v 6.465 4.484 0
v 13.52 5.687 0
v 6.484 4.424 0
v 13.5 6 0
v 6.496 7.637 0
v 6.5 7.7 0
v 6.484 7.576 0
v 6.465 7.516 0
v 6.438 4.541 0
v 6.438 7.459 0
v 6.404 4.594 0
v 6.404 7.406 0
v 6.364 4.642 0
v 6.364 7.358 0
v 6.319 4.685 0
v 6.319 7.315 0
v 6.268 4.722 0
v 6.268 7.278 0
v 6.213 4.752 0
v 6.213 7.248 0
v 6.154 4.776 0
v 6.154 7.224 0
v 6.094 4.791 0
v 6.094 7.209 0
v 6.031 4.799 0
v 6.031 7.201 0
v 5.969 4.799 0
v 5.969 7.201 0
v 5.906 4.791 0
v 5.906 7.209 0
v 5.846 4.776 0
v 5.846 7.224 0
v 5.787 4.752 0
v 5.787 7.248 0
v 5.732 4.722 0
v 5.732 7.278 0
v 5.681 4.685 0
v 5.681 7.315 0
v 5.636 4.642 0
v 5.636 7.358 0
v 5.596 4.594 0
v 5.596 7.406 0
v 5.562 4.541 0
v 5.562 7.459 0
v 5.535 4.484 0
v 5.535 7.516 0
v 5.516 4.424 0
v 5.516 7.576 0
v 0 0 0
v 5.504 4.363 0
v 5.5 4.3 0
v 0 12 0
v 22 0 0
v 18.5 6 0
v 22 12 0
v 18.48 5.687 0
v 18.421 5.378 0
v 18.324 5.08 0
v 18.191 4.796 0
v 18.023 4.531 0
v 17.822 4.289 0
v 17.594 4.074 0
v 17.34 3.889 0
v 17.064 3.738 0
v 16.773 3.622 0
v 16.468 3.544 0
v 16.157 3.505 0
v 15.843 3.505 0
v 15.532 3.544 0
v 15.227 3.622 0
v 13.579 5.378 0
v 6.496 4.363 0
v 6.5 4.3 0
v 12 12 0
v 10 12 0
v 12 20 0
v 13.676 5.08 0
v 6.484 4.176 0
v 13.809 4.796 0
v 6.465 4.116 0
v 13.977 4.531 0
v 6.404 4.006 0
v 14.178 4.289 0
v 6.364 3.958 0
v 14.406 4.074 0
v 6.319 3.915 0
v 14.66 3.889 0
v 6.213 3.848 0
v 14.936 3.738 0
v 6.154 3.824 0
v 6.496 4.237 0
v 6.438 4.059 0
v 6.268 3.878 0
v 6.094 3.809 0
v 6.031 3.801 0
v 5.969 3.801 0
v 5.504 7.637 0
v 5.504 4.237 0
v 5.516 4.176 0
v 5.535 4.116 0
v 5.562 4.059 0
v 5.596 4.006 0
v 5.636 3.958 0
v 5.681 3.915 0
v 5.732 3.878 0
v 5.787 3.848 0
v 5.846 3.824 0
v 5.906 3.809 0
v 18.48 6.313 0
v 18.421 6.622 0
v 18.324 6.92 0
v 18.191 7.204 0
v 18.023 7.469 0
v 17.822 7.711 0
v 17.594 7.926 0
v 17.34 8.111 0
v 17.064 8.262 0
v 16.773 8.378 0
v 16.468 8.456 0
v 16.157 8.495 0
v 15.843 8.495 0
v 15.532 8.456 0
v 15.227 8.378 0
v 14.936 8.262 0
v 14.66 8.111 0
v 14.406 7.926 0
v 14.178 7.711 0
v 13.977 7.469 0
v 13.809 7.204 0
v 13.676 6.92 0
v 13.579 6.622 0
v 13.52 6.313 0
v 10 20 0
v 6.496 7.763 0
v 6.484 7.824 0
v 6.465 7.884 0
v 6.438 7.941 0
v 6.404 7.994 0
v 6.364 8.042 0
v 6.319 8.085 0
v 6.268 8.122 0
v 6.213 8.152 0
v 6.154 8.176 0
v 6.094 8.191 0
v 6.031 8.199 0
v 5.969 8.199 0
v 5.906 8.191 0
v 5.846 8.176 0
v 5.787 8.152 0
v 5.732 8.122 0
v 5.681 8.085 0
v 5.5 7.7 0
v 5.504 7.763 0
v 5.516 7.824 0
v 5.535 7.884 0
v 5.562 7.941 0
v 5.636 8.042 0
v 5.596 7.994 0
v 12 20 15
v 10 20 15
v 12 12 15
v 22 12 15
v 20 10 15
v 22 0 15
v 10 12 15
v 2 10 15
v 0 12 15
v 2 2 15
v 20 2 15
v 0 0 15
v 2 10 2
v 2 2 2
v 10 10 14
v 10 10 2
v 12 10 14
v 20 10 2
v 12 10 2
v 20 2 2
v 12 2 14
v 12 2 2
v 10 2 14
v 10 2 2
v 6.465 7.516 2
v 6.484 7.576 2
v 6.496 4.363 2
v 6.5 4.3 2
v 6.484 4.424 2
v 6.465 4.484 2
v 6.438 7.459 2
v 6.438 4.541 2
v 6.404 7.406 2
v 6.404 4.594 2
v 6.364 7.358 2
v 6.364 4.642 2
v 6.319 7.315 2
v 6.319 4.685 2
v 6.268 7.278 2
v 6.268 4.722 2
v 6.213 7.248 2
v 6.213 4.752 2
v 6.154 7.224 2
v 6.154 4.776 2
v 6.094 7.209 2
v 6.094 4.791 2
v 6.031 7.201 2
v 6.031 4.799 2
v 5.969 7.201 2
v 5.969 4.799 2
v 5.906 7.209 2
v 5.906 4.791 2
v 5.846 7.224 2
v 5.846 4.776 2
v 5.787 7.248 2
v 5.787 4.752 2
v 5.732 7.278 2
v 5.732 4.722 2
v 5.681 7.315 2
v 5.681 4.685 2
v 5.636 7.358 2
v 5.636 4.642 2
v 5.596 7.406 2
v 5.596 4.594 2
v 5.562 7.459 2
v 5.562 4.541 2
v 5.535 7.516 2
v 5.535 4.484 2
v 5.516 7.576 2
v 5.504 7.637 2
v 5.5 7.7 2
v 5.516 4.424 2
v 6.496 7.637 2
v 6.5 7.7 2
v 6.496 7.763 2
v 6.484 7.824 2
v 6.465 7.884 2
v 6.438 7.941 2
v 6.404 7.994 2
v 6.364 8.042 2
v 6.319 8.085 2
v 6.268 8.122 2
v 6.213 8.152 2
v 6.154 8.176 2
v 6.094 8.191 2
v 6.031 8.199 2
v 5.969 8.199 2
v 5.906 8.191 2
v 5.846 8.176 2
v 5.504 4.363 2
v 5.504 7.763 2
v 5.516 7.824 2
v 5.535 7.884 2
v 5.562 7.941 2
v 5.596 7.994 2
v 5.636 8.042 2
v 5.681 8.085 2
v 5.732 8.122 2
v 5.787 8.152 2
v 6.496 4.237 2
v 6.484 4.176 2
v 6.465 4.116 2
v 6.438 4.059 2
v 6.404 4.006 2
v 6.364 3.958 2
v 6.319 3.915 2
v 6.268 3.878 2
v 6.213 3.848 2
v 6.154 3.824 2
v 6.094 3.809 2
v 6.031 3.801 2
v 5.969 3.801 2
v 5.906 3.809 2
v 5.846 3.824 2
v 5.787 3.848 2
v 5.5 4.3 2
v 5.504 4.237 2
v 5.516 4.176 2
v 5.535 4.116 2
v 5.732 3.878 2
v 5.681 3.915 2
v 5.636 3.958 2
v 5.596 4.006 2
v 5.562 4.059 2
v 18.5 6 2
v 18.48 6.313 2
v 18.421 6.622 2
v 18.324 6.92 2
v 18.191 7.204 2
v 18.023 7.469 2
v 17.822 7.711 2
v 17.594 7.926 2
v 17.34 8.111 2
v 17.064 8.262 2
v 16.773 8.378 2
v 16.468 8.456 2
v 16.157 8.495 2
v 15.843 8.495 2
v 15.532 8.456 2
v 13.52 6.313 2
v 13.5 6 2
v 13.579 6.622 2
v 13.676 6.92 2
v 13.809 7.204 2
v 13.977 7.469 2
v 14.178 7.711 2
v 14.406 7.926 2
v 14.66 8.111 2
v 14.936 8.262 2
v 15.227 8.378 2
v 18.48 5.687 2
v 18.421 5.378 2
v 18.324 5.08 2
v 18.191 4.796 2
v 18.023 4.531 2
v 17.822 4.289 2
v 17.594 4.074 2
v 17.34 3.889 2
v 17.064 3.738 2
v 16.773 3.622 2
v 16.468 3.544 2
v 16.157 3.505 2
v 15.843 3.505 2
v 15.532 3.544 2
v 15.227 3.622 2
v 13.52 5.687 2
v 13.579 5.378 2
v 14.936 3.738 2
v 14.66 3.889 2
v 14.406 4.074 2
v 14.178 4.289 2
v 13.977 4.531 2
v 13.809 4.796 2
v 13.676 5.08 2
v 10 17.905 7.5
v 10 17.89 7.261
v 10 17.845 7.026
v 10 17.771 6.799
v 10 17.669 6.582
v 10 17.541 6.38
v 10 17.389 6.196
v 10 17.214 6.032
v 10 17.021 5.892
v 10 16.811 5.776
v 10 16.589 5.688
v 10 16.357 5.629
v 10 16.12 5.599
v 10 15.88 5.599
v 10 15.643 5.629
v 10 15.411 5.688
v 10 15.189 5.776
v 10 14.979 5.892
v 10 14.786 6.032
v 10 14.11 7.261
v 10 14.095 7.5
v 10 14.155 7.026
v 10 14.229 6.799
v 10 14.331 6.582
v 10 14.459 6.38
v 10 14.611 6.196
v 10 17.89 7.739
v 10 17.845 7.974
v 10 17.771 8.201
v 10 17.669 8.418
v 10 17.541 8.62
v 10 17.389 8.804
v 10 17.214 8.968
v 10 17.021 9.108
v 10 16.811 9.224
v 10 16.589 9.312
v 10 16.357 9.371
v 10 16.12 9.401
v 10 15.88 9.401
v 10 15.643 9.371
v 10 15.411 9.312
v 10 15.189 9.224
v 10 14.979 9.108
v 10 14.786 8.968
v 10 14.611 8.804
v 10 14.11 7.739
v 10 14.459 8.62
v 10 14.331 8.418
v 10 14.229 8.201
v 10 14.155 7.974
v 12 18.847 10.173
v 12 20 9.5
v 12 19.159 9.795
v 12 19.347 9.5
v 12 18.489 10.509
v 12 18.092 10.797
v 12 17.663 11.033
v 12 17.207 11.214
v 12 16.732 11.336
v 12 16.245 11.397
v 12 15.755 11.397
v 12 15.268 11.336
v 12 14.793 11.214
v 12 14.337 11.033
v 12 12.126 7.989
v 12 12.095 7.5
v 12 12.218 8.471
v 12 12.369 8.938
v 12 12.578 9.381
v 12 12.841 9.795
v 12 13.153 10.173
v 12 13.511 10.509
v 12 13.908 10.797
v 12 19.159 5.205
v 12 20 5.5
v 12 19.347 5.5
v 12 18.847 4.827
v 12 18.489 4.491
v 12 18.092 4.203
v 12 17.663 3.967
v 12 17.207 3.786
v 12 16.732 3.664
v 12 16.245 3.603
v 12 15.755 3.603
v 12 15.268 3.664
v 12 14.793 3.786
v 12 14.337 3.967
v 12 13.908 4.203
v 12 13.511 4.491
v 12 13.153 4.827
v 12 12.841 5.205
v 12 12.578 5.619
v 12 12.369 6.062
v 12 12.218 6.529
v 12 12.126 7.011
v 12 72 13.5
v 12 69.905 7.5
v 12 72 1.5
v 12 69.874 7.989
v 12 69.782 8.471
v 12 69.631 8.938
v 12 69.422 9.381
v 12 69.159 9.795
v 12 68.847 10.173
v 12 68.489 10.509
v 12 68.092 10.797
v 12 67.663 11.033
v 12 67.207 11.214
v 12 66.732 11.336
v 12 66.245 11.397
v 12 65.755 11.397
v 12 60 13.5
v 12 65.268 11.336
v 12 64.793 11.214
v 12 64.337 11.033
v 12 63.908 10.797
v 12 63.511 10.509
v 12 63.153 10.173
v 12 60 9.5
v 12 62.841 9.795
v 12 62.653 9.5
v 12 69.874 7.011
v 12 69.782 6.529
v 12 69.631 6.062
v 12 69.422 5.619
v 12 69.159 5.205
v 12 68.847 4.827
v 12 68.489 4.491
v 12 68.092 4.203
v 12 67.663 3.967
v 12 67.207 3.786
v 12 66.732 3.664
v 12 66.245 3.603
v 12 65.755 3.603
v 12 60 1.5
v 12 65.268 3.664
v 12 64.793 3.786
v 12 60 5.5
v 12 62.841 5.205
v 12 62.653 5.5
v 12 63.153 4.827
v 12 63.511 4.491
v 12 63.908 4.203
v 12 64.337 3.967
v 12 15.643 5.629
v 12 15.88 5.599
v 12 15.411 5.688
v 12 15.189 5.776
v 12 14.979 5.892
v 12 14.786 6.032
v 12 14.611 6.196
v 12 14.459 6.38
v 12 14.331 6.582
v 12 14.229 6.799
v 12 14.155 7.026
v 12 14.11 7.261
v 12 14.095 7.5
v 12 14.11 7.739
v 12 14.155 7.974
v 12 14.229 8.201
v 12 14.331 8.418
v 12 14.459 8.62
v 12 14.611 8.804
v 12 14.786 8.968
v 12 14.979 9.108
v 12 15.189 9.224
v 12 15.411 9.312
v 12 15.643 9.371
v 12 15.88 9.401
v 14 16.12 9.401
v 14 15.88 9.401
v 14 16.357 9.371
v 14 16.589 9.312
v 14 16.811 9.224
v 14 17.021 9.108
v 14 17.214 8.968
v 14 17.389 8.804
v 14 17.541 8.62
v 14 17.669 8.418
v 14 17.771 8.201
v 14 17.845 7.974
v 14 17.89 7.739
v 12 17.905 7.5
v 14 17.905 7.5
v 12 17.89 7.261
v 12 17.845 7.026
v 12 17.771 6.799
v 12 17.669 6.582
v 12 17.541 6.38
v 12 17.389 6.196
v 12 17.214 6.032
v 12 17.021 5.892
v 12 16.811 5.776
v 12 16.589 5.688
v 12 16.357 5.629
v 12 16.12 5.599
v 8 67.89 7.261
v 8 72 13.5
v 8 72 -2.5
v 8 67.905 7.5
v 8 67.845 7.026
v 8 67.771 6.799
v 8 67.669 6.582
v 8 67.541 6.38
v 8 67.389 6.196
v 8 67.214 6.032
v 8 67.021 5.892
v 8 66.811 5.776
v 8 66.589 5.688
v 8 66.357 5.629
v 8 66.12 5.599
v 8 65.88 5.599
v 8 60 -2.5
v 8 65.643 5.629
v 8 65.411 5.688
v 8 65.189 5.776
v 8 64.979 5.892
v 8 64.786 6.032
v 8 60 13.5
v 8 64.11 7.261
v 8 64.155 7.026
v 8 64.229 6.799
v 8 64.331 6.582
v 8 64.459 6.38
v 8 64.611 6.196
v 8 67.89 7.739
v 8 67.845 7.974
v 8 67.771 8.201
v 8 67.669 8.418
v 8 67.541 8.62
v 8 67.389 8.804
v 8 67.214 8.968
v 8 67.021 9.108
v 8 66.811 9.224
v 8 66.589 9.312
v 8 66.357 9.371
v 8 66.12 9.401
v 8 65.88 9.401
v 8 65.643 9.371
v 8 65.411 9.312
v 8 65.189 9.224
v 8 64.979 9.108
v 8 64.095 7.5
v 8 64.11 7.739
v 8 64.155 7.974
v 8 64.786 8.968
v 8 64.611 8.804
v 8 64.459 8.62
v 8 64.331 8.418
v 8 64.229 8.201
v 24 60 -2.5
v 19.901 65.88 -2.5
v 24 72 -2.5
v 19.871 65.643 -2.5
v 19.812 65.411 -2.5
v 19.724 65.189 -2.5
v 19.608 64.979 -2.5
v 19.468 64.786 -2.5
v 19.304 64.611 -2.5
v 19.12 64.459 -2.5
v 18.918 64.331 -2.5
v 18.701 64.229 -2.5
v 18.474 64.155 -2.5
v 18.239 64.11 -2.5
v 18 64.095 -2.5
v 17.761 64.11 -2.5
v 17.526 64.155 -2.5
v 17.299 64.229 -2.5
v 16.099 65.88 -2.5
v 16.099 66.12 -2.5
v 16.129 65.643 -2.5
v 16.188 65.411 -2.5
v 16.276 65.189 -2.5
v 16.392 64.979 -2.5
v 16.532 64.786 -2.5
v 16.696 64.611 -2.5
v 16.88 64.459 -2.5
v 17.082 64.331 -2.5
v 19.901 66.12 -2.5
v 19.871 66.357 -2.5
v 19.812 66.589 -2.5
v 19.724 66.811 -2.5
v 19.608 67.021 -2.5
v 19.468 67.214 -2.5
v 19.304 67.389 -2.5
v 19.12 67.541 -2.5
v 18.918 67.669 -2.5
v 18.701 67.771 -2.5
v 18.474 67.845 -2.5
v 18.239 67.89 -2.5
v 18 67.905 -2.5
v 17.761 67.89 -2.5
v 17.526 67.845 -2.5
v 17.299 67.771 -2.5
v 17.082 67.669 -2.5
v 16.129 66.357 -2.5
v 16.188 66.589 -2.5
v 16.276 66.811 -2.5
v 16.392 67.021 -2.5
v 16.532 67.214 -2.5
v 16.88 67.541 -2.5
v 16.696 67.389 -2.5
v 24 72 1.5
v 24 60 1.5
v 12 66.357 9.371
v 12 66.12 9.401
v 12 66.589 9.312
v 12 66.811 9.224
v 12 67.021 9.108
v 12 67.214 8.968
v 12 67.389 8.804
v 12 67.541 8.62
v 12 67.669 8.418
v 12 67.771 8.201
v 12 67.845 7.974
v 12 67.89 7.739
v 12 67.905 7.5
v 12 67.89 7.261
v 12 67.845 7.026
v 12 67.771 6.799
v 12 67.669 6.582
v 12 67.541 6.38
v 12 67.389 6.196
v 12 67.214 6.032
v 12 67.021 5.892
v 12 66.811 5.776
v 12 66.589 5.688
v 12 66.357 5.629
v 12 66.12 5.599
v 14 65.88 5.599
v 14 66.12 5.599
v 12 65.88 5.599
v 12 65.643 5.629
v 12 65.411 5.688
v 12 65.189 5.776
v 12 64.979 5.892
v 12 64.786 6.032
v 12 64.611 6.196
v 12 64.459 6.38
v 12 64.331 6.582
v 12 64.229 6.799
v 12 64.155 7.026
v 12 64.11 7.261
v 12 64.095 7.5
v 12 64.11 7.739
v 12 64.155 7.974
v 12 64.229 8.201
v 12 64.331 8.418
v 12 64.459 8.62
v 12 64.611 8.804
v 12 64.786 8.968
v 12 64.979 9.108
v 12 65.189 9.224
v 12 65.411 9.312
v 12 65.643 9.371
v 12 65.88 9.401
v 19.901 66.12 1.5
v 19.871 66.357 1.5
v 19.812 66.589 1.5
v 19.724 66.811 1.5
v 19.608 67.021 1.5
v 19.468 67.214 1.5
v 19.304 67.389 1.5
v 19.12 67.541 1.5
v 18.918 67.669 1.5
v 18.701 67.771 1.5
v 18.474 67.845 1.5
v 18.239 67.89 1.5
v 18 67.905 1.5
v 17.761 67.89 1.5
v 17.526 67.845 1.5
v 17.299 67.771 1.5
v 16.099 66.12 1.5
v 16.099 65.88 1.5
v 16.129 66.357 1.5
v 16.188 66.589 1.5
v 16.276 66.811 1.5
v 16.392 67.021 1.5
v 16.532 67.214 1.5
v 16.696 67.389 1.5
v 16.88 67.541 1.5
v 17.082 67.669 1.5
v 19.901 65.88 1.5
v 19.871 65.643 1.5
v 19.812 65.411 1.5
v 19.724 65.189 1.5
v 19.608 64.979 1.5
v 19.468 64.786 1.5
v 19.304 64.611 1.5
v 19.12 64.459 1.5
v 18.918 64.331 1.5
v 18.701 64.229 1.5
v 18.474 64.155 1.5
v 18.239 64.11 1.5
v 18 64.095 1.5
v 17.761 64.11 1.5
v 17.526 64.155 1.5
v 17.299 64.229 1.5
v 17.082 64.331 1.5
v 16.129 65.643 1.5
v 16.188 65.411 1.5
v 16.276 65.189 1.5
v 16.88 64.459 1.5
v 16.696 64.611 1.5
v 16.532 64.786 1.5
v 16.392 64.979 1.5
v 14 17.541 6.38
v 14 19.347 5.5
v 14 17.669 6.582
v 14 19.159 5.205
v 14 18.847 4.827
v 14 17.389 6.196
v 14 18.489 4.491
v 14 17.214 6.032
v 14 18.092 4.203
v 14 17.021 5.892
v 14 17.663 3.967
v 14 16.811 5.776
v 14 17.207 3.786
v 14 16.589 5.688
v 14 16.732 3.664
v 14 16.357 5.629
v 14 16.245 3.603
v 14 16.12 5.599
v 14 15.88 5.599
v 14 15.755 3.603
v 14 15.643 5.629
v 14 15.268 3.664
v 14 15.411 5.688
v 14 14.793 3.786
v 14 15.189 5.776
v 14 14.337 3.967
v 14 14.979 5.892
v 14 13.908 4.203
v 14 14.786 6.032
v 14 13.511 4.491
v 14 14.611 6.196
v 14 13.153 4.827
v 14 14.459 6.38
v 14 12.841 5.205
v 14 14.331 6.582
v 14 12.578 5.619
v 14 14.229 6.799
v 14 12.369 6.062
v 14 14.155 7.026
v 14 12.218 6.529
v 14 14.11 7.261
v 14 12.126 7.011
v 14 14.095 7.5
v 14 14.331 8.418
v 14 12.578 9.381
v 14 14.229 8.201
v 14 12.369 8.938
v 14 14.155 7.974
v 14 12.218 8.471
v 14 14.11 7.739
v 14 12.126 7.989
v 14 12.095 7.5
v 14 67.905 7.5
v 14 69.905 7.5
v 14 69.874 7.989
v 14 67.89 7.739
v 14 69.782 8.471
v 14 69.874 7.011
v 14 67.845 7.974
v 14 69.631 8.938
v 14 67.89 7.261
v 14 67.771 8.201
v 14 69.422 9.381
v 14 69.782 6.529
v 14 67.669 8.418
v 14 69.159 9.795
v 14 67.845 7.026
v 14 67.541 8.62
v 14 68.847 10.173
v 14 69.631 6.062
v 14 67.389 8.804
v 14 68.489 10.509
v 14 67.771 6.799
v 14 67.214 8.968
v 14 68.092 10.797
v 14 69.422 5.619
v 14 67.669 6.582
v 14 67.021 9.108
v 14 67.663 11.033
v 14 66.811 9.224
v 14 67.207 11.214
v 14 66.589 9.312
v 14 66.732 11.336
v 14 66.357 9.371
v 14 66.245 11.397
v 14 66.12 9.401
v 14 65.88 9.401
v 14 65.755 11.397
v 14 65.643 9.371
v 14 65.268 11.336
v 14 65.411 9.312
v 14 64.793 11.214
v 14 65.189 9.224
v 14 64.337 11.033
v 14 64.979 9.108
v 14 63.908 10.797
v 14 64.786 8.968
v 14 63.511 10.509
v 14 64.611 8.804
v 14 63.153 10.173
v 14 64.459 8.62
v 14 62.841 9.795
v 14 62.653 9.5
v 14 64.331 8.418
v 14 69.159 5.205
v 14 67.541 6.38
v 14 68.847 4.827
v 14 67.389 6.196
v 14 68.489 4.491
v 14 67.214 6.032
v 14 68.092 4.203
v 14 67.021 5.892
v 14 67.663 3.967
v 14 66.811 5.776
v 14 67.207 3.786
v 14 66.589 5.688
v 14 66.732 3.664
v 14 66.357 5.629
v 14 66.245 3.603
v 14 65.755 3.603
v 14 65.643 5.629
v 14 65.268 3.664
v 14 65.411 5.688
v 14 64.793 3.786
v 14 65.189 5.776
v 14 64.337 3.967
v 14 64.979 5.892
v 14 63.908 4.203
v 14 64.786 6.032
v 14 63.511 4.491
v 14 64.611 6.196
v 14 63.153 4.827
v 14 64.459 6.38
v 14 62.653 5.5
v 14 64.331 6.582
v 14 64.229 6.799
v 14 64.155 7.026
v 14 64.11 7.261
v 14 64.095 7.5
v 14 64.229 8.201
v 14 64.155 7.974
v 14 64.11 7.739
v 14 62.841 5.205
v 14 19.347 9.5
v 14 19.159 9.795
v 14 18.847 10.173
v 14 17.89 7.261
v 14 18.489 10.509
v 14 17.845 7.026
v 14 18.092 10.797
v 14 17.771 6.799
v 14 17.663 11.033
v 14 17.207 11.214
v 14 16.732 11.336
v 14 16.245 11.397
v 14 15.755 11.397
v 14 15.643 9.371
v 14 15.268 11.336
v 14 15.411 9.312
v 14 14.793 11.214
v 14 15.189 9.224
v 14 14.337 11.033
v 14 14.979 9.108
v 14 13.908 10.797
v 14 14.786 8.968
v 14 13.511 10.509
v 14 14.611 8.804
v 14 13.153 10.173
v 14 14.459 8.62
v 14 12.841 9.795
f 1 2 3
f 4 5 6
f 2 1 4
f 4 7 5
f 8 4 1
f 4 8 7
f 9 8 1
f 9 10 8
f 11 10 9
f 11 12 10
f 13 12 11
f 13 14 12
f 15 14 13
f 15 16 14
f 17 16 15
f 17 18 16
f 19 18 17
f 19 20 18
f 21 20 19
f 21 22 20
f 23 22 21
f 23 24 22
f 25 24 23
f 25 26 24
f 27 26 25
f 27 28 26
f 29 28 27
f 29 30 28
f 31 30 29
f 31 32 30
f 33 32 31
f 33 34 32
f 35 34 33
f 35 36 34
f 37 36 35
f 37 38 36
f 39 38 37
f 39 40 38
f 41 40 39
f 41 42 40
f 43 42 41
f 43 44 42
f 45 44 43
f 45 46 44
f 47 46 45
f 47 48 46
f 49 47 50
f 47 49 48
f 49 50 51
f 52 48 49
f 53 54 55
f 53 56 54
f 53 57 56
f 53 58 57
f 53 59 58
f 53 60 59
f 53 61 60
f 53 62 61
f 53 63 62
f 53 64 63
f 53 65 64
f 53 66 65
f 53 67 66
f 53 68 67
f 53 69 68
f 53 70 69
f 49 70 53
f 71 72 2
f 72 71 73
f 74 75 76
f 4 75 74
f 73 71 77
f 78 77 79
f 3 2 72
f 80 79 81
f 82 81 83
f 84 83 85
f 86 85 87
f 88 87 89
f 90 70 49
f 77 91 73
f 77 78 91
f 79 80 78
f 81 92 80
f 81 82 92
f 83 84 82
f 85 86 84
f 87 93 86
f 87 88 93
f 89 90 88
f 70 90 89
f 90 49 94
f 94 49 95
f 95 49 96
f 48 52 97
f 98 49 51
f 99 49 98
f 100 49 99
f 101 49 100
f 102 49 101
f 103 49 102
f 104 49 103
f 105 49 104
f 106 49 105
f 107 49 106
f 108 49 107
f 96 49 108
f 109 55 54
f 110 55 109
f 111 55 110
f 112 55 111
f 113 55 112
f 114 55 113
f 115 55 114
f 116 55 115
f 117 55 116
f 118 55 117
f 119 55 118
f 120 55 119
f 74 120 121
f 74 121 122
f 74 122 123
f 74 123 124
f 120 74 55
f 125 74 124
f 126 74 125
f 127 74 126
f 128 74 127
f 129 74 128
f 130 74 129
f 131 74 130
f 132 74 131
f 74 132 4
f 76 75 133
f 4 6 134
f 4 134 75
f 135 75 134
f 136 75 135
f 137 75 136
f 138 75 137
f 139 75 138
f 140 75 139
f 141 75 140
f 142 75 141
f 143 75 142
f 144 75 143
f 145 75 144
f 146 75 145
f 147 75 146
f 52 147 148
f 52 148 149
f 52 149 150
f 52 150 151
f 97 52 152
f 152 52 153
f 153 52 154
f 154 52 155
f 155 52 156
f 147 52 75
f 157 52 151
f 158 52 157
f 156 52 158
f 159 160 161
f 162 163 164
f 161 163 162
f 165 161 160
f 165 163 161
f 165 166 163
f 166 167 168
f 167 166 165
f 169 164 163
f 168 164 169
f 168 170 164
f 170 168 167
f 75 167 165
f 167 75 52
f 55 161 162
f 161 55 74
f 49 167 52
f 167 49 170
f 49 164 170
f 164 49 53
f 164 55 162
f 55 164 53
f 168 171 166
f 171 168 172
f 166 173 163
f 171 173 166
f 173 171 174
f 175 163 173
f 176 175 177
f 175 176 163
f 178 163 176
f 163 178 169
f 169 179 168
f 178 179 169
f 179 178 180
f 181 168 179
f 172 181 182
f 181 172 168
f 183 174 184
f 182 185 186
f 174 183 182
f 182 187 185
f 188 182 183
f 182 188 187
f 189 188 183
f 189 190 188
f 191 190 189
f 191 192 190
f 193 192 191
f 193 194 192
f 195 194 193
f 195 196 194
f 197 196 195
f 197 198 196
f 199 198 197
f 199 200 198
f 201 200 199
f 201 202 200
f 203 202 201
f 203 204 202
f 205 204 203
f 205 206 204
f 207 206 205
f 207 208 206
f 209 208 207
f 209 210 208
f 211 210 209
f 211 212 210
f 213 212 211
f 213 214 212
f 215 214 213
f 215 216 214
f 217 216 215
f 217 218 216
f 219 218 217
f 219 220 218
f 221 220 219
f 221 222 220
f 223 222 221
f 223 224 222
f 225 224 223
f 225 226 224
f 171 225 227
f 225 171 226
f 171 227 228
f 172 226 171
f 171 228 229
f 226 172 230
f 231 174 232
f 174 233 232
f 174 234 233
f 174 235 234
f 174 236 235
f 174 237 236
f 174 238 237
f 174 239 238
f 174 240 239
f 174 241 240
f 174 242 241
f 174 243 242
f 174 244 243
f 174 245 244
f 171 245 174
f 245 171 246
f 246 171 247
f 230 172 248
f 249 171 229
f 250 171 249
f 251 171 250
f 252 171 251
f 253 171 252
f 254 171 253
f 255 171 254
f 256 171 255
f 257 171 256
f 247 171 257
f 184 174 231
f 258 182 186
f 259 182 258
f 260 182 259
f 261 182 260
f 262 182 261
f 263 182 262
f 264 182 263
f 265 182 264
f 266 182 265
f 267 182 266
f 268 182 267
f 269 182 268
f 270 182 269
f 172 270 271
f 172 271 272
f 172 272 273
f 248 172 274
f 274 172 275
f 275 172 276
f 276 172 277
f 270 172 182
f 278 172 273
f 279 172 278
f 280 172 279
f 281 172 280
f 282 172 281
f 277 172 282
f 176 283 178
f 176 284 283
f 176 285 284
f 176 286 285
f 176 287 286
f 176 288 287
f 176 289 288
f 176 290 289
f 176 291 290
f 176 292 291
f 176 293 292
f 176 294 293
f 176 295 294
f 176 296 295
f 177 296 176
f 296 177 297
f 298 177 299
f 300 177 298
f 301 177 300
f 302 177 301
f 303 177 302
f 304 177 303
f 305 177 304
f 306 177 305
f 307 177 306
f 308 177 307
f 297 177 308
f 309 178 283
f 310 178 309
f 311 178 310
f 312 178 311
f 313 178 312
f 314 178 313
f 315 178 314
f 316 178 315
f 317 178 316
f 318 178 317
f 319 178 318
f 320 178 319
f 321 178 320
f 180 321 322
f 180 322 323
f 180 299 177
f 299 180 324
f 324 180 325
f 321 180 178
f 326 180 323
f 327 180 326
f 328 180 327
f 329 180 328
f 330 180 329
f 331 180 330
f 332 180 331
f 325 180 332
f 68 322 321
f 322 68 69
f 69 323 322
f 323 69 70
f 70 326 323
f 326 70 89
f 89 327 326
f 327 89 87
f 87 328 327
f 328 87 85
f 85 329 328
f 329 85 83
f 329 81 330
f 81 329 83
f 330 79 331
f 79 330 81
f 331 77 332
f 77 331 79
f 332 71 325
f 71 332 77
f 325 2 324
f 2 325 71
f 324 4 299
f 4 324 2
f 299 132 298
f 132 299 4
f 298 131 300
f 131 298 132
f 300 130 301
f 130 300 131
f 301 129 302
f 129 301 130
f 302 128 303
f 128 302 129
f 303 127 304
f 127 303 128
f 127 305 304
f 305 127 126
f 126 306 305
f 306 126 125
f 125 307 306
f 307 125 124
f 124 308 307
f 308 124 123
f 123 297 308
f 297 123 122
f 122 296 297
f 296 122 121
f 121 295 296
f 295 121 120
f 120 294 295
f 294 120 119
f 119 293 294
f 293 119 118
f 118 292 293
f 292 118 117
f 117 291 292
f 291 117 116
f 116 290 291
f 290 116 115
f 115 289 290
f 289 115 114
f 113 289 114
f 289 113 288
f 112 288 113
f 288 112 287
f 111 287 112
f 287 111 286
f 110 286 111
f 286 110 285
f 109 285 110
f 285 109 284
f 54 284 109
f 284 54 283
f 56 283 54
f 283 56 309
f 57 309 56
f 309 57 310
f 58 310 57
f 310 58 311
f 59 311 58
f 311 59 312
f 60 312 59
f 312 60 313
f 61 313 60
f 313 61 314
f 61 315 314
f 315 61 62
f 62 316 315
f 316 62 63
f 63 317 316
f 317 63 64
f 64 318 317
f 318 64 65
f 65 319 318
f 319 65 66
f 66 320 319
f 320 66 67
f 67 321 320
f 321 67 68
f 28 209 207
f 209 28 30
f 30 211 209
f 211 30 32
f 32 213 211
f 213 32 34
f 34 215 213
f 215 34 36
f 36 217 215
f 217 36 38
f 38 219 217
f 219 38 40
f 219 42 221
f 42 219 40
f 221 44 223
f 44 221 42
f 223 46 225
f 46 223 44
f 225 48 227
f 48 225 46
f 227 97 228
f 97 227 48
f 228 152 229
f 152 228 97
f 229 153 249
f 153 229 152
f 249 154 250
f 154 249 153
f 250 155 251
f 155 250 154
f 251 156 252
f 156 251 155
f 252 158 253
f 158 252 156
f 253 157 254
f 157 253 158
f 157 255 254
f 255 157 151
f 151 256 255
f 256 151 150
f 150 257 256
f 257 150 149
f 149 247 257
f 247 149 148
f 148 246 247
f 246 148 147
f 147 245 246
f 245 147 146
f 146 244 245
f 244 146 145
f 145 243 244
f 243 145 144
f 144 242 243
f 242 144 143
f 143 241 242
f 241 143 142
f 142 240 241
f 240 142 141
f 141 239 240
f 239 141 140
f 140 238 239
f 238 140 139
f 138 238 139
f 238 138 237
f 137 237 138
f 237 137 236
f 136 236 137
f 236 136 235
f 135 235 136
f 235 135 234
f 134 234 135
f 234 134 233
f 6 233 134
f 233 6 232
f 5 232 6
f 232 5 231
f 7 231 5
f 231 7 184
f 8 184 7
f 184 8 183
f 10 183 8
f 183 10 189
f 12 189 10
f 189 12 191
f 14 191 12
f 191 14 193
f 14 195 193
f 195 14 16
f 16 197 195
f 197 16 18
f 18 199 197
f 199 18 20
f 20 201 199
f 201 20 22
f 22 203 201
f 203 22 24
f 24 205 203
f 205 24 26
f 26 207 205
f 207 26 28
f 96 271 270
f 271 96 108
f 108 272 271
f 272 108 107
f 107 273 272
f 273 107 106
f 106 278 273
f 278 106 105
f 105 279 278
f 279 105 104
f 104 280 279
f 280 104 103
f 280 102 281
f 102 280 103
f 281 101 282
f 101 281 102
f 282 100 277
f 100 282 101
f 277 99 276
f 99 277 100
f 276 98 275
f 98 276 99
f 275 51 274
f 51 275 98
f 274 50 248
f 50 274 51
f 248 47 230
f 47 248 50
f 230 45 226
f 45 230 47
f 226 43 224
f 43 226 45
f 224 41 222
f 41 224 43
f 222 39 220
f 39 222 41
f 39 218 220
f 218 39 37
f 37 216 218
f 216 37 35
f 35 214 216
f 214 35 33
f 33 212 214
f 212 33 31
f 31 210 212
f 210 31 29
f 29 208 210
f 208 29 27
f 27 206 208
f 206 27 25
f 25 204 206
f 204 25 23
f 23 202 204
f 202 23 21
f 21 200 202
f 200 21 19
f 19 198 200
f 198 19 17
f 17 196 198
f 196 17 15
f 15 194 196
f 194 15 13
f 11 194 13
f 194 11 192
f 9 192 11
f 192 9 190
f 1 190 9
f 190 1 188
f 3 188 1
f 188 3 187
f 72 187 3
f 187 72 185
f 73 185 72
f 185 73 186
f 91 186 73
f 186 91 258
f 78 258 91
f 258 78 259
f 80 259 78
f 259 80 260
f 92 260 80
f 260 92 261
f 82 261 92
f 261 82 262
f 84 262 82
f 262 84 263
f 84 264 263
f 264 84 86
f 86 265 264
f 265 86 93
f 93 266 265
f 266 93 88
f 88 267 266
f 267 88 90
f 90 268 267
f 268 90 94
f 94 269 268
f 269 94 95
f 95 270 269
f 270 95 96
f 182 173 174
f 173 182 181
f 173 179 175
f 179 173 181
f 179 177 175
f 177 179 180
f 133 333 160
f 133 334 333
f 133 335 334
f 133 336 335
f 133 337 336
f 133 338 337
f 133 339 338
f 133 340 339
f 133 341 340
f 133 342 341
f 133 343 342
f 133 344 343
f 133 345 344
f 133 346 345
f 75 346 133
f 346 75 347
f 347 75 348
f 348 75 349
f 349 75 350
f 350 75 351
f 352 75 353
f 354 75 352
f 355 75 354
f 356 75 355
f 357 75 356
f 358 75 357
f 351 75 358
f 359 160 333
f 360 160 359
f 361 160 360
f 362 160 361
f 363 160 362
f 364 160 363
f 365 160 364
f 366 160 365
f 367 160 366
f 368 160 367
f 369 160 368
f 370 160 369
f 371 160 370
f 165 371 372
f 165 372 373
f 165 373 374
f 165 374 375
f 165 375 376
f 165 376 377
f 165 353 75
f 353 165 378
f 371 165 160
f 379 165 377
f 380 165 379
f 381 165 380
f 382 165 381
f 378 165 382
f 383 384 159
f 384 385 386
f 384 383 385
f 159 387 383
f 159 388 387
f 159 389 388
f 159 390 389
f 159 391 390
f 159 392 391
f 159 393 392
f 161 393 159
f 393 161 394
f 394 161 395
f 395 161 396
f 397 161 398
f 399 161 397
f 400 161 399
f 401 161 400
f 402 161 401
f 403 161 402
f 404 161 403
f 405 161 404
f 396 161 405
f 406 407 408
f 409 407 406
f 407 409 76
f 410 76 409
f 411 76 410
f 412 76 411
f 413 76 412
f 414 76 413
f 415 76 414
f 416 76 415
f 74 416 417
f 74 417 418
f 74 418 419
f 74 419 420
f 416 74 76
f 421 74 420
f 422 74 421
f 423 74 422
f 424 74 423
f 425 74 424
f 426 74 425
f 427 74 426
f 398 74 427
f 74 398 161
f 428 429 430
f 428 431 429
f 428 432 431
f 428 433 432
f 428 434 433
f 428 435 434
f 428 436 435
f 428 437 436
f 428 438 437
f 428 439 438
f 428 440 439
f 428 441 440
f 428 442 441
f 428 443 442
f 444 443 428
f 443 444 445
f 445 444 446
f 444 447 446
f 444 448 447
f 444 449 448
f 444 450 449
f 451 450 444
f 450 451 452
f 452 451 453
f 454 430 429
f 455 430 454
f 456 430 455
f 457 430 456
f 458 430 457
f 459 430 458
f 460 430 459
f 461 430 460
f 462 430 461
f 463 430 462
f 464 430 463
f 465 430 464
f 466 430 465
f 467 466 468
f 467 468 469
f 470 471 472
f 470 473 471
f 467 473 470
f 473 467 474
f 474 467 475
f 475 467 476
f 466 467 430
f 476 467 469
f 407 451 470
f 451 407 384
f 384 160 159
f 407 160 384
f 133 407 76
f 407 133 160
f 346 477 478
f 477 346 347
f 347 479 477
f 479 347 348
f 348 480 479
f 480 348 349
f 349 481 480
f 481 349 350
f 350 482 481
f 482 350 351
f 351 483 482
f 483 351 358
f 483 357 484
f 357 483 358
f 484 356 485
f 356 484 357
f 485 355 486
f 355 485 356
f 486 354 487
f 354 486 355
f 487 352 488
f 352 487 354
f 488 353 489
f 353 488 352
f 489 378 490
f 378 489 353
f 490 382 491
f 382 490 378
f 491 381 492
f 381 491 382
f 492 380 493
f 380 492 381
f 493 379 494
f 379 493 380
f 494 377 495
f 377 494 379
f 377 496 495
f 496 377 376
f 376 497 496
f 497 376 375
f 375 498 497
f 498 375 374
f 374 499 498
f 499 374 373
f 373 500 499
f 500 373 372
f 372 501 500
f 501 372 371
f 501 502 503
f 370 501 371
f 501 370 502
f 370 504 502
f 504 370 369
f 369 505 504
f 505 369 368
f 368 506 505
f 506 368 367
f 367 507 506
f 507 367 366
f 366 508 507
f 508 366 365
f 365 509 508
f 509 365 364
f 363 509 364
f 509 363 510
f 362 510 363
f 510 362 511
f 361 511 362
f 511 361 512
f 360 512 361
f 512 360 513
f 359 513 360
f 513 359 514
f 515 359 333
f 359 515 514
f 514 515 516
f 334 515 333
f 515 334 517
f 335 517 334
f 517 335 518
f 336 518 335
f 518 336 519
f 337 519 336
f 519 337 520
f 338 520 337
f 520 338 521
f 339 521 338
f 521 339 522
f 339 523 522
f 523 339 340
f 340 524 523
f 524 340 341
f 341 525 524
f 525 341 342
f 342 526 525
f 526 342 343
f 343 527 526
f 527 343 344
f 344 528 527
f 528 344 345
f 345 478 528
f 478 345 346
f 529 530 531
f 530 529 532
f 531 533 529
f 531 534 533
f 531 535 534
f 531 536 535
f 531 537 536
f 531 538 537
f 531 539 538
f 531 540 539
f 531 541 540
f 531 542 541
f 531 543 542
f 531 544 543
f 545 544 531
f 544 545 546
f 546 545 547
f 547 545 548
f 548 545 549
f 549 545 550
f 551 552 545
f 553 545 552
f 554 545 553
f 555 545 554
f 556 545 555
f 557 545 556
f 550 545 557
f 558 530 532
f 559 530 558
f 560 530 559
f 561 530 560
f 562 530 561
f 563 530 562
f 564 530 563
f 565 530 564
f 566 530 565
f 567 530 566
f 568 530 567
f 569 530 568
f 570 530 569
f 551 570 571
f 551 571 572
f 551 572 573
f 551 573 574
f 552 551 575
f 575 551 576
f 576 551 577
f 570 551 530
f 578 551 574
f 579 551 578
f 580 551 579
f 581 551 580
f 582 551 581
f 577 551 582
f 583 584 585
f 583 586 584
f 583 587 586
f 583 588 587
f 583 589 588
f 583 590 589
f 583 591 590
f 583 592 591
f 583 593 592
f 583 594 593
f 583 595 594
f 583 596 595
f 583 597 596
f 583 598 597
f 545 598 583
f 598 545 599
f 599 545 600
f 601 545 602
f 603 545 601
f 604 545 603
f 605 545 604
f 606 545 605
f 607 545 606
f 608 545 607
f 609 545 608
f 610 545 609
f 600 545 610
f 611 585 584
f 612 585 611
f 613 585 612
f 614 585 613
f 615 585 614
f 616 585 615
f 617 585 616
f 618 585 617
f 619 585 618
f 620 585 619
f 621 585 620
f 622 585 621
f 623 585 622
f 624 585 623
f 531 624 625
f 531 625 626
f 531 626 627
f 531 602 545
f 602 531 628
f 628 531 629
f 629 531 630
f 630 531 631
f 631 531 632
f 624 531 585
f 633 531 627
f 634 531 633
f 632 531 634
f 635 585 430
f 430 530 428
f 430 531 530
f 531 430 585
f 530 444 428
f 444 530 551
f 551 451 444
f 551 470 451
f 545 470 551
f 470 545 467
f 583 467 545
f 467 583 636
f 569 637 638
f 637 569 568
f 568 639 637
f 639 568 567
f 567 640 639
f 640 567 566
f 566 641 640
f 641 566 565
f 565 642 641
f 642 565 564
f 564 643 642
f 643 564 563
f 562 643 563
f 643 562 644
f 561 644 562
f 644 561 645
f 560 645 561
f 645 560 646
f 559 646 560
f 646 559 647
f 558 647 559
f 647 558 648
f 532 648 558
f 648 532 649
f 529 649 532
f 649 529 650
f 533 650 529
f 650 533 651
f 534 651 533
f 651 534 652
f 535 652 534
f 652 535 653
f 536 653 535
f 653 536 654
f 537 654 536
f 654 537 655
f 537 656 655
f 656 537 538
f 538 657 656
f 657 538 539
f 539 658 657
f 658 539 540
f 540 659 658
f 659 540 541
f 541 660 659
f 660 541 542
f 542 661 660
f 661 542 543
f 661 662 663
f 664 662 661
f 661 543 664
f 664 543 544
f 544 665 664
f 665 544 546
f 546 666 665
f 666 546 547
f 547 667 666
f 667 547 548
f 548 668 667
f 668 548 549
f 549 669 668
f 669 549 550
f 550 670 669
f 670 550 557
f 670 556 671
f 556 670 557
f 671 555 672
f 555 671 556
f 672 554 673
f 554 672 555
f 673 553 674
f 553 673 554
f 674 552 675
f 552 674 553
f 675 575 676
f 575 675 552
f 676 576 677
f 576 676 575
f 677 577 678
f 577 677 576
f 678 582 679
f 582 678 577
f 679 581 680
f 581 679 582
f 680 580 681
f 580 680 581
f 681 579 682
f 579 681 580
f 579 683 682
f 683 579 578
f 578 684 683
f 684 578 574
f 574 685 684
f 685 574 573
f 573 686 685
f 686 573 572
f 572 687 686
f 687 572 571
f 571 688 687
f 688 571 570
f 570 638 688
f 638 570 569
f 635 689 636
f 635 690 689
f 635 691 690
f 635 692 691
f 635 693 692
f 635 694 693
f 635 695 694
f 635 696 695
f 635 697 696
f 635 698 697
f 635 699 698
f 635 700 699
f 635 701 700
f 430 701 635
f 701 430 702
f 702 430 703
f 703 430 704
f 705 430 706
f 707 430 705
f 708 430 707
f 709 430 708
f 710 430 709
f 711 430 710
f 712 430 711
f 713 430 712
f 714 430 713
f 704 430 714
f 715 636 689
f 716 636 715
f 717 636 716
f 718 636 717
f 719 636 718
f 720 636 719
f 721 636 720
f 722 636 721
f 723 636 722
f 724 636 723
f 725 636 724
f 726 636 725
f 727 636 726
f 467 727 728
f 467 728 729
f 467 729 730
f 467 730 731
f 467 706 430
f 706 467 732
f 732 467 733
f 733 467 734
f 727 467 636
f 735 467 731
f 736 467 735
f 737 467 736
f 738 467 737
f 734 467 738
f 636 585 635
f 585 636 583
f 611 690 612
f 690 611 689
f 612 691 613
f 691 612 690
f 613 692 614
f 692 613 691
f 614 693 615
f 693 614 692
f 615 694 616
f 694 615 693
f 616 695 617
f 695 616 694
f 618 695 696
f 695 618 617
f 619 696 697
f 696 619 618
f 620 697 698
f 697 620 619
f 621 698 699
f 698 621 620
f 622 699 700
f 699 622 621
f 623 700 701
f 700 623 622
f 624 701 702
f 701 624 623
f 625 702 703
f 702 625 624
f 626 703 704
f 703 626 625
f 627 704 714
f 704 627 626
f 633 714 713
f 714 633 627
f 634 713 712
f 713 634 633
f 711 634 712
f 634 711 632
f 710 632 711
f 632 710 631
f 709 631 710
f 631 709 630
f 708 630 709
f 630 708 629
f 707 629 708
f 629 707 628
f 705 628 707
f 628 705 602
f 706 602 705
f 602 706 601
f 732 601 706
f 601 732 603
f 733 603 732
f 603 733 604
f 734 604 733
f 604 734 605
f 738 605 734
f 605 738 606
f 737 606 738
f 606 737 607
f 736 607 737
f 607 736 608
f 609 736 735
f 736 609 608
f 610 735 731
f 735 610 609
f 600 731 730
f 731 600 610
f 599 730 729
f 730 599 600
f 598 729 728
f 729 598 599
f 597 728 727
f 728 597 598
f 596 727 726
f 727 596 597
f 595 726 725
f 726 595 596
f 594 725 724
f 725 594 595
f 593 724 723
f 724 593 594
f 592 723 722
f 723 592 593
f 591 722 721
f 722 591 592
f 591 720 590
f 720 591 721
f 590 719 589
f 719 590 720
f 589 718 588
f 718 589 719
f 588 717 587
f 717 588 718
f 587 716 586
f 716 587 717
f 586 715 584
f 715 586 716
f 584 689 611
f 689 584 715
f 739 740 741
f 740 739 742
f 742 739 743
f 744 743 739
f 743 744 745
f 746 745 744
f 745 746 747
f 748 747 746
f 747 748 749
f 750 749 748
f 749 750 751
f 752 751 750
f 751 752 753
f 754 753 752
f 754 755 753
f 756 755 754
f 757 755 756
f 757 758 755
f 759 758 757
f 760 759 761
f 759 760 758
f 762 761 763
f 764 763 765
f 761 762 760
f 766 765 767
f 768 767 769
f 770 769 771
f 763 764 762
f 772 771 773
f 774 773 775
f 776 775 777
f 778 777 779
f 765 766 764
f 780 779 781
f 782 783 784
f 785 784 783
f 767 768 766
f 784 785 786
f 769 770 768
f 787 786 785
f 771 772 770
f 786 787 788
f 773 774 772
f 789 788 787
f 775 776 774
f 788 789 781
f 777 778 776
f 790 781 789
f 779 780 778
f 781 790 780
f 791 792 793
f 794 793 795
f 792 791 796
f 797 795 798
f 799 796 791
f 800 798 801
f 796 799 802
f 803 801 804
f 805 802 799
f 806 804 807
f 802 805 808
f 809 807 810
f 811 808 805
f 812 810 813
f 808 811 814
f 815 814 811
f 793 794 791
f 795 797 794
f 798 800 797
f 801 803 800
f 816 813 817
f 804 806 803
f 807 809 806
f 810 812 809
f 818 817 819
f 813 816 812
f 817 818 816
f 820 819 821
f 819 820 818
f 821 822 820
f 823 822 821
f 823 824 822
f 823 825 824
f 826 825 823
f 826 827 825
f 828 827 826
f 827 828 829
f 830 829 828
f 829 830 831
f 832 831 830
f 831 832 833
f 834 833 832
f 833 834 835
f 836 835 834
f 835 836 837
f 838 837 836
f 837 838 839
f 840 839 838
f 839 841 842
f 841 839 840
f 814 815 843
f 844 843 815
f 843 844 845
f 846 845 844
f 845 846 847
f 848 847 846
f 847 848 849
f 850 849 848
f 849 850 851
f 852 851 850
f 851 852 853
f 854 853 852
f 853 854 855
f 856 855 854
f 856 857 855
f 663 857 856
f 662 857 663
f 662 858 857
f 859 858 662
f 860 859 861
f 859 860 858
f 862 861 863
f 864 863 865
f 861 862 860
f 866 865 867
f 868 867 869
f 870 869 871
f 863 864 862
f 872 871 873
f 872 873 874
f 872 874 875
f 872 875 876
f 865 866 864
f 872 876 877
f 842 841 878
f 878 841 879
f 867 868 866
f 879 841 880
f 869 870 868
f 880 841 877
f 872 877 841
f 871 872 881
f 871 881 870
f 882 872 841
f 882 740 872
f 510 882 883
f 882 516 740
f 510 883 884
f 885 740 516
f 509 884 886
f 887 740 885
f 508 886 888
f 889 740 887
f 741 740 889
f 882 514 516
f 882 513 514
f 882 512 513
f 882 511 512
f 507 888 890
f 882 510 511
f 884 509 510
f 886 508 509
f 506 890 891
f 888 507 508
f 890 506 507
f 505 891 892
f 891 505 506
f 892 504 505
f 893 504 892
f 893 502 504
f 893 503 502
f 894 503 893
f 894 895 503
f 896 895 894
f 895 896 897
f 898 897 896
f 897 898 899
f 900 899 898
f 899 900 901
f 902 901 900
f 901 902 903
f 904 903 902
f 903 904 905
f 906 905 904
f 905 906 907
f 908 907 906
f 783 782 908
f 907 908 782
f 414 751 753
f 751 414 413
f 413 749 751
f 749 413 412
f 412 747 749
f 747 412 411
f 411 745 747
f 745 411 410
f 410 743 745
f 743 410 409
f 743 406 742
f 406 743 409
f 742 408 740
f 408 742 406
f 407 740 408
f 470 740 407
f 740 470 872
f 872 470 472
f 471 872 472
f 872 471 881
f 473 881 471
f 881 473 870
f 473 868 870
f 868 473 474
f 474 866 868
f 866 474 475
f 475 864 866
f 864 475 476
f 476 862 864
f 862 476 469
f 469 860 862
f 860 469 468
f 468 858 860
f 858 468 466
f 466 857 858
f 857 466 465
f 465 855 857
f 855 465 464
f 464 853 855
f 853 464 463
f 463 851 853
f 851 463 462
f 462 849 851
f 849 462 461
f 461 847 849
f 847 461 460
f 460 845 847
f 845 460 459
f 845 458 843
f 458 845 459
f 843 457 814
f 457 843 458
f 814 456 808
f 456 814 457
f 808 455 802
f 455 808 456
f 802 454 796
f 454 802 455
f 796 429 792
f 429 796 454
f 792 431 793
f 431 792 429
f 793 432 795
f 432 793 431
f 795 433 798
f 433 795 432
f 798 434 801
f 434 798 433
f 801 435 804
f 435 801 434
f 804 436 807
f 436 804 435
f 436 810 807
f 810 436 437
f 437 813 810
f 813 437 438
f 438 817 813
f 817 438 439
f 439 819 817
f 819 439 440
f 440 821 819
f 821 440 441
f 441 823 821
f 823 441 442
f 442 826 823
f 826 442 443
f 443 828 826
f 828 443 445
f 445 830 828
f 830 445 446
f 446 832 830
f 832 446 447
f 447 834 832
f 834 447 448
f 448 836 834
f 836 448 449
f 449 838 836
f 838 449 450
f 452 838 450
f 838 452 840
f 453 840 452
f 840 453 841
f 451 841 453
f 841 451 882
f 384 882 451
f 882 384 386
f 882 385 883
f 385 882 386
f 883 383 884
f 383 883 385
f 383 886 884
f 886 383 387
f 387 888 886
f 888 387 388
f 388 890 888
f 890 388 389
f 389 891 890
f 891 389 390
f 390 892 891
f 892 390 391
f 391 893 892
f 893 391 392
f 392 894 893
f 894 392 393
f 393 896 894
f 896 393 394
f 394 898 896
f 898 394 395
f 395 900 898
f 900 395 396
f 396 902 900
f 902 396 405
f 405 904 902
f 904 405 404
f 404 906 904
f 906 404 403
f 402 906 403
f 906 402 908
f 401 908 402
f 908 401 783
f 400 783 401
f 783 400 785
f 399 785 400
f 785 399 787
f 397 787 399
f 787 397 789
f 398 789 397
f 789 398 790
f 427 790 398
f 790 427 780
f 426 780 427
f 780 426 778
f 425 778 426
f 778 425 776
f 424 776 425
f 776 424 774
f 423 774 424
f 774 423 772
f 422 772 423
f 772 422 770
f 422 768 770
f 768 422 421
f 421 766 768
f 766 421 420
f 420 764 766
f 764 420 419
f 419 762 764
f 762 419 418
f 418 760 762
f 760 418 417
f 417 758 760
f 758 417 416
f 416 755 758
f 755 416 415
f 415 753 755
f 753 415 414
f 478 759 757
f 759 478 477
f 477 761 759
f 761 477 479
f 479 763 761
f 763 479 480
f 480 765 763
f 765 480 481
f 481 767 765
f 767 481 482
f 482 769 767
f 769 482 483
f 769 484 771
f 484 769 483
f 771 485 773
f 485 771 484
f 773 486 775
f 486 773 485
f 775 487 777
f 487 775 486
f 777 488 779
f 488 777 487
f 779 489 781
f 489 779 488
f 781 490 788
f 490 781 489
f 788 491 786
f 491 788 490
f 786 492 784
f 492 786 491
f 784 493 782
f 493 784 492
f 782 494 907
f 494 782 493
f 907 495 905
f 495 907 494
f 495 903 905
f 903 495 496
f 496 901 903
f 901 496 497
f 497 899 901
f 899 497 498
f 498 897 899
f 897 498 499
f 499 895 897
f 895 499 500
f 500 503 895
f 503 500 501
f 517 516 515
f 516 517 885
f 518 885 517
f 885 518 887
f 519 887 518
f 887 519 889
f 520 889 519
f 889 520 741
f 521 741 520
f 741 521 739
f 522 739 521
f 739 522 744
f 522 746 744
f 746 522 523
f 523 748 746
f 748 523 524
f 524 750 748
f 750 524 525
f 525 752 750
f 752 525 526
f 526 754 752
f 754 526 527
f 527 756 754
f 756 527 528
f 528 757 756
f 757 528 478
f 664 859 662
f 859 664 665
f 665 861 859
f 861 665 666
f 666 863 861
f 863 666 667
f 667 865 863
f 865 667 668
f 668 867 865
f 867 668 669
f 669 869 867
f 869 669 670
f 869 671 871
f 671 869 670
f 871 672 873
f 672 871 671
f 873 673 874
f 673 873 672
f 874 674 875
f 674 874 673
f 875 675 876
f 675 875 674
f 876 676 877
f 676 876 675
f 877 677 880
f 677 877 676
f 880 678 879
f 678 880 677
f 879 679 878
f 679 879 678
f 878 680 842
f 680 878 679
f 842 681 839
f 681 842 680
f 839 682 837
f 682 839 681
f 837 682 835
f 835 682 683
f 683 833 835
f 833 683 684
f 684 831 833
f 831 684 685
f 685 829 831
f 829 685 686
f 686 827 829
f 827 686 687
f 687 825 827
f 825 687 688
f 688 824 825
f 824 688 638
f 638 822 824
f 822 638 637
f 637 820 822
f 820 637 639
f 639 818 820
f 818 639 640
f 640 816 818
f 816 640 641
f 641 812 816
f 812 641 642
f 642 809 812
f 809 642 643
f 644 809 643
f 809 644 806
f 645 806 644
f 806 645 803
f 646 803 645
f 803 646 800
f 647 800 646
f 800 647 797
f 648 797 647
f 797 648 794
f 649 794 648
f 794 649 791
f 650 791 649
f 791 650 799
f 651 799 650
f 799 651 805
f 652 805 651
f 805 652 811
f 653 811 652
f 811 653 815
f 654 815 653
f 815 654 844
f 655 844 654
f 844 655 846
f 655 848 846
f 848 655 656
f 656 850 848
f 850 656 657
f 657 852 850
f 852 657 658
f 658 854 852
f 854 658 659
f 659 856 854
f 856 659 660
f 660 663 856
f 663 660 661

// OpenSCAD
$fn = 50;

inches_to_mm = 25.4;

mounting_hole_diameter = 0.150*inches_to_mm;
mounting_tab_width = 8;

wall_thickness = 2;
box_size = 8;
shroud_height = 13;
baffle_height = 12;

cds_wire_centers = 3.4;
cds_wire_diameter = 1;

led_diameter = 5;

sensor_centers =7;

arm_width = 4;
arm_length =  50;

robot_mounting_tab_width = 12;
robot_mounting_tab_thickness = 4;

// -------------------------- parts -----------------

//color("red") color_sensor();
//color("blue") sensor_arm();
//color("green") robot_mount();

// ----------------- assembly --------------

color("red") color_sensor();
color("blue") translate([wall_thickness+box_size+wall_thickness, wall_thickness+box_size+wall_thickness+mounting_tab_width/2, (wall_thickness+shroud_height)/2]) rotate([90,0,90]) sensor_arm();
color("green") translate([wall_thickness+box_size+wall_thickness, wall_thickness+box_size+wall_thickness+mounting_tab_width/2+arm_length, (wall_thickness+shroud_height)/2]) rotate([-90,0,-90]) translate([-robot_mounting_tab_width/2, -robot_mounting_tab_width/2,-robot_mounting_tab_thickness]) robot_mount();

// ---------------------- modules -------------------

module color_sensor()
{
  // outer shell
  linear_extrude(height = wall_thickness+shroud_height) difference()
  {
    square([2*wall_thickness+wall_thickness+2*box_size, 2*wall_thickness+box_size]);
    translate([wall_thickness, wall_thickness]) square([wall_thickness+2*box_size, box_size]);
  }
  
  // bottom
  linear_extrude(height = wall_thickness) difference()
  {
    square([2*wall_thickness+wall_thickness+2*box_size, 2*wall_thickness+box_size]);
    // LED
    translate([wall_thickness+box_size+wall_thickness+box_size/2, wall_thickness+box_size/2]) circle(r = led_diameter/2);
    
    // cds photocell
    translate([wall_thickness+box_size/2, wall_thickness+box_size/2]) union()
    {
      translate([0,cds_wire_centers/2]) circle(r=cds_wire_diameter/2);
      translate([0,-cds_wire_centers/2]) circle(r=cds_wire_diameter/2);
    }
  }
  
  // baffle
  linear_extrude(height = wall_thickness+baffle_height) translate([wall_thickness+box_size, wall_thickness]) square([wall_thickness, box_size]);
  
  // mounting tab
  translate([wall_thickness+box_size, 2*wall_thickness+box_size,0]) rotate([90,0,90]) linear_extrude(height=wall_thickness) difference()
  {
    square([mounting_tab_width, wall_thickness+shroud_height]);
    translate([mounting_tab_width/2, (wall_thickness+shroud_height)/2]) circle(r=mounting_hole_diameter/2);
  }
}

module sensor_arm()
{
  linear_extrude(height = wall_thickness) difference()
  {
    union()
    {
      translate([0,-arm_width/2]) square([arm_length, arm_width]);
      circle(r= mounting_hole_diameter/2+arm_width/2);
      translate([arm_length,0,0]) circle(r= mounting_hole_diameter/2+arm_width/2);    
    }
    
    circle(r= mounting_hole_diameter/2);
    translate([arm_length,0,0]) circle(r= mounting_hole_diameter/2);
  }
}

module robot_mount()
{
  linear_extrude(height = robot_mounting_tab_thickness) difference()
  {
    square([robot_mounting_tab_width,robot_mounting_tab_width+robot_mounting_tab_thickness]);
    translate([robot_mounting_tab_width/2, robot_mounting_tab_width/2]) circle(r=mounting_hole_diameter/2);
  }
  
  translate([0,robot_mounting_tab_width,0,]) rotate([-90,0,0]) linear_extrude(height = robot_mounting_tab_thickness) translate([0,-robot_mounting_tab_width-robot_mounting_tab_thickness]) difference()
  {
    square([robot_mounting_tab_width,robot_mounting_tab_width+robot_mounting_tab_thickness]);
    translate([robot_mounting_tab_width/2, robot_mounting_tab_width/2]) circle(r=mounting_hole_diameter/2);
  }
}
